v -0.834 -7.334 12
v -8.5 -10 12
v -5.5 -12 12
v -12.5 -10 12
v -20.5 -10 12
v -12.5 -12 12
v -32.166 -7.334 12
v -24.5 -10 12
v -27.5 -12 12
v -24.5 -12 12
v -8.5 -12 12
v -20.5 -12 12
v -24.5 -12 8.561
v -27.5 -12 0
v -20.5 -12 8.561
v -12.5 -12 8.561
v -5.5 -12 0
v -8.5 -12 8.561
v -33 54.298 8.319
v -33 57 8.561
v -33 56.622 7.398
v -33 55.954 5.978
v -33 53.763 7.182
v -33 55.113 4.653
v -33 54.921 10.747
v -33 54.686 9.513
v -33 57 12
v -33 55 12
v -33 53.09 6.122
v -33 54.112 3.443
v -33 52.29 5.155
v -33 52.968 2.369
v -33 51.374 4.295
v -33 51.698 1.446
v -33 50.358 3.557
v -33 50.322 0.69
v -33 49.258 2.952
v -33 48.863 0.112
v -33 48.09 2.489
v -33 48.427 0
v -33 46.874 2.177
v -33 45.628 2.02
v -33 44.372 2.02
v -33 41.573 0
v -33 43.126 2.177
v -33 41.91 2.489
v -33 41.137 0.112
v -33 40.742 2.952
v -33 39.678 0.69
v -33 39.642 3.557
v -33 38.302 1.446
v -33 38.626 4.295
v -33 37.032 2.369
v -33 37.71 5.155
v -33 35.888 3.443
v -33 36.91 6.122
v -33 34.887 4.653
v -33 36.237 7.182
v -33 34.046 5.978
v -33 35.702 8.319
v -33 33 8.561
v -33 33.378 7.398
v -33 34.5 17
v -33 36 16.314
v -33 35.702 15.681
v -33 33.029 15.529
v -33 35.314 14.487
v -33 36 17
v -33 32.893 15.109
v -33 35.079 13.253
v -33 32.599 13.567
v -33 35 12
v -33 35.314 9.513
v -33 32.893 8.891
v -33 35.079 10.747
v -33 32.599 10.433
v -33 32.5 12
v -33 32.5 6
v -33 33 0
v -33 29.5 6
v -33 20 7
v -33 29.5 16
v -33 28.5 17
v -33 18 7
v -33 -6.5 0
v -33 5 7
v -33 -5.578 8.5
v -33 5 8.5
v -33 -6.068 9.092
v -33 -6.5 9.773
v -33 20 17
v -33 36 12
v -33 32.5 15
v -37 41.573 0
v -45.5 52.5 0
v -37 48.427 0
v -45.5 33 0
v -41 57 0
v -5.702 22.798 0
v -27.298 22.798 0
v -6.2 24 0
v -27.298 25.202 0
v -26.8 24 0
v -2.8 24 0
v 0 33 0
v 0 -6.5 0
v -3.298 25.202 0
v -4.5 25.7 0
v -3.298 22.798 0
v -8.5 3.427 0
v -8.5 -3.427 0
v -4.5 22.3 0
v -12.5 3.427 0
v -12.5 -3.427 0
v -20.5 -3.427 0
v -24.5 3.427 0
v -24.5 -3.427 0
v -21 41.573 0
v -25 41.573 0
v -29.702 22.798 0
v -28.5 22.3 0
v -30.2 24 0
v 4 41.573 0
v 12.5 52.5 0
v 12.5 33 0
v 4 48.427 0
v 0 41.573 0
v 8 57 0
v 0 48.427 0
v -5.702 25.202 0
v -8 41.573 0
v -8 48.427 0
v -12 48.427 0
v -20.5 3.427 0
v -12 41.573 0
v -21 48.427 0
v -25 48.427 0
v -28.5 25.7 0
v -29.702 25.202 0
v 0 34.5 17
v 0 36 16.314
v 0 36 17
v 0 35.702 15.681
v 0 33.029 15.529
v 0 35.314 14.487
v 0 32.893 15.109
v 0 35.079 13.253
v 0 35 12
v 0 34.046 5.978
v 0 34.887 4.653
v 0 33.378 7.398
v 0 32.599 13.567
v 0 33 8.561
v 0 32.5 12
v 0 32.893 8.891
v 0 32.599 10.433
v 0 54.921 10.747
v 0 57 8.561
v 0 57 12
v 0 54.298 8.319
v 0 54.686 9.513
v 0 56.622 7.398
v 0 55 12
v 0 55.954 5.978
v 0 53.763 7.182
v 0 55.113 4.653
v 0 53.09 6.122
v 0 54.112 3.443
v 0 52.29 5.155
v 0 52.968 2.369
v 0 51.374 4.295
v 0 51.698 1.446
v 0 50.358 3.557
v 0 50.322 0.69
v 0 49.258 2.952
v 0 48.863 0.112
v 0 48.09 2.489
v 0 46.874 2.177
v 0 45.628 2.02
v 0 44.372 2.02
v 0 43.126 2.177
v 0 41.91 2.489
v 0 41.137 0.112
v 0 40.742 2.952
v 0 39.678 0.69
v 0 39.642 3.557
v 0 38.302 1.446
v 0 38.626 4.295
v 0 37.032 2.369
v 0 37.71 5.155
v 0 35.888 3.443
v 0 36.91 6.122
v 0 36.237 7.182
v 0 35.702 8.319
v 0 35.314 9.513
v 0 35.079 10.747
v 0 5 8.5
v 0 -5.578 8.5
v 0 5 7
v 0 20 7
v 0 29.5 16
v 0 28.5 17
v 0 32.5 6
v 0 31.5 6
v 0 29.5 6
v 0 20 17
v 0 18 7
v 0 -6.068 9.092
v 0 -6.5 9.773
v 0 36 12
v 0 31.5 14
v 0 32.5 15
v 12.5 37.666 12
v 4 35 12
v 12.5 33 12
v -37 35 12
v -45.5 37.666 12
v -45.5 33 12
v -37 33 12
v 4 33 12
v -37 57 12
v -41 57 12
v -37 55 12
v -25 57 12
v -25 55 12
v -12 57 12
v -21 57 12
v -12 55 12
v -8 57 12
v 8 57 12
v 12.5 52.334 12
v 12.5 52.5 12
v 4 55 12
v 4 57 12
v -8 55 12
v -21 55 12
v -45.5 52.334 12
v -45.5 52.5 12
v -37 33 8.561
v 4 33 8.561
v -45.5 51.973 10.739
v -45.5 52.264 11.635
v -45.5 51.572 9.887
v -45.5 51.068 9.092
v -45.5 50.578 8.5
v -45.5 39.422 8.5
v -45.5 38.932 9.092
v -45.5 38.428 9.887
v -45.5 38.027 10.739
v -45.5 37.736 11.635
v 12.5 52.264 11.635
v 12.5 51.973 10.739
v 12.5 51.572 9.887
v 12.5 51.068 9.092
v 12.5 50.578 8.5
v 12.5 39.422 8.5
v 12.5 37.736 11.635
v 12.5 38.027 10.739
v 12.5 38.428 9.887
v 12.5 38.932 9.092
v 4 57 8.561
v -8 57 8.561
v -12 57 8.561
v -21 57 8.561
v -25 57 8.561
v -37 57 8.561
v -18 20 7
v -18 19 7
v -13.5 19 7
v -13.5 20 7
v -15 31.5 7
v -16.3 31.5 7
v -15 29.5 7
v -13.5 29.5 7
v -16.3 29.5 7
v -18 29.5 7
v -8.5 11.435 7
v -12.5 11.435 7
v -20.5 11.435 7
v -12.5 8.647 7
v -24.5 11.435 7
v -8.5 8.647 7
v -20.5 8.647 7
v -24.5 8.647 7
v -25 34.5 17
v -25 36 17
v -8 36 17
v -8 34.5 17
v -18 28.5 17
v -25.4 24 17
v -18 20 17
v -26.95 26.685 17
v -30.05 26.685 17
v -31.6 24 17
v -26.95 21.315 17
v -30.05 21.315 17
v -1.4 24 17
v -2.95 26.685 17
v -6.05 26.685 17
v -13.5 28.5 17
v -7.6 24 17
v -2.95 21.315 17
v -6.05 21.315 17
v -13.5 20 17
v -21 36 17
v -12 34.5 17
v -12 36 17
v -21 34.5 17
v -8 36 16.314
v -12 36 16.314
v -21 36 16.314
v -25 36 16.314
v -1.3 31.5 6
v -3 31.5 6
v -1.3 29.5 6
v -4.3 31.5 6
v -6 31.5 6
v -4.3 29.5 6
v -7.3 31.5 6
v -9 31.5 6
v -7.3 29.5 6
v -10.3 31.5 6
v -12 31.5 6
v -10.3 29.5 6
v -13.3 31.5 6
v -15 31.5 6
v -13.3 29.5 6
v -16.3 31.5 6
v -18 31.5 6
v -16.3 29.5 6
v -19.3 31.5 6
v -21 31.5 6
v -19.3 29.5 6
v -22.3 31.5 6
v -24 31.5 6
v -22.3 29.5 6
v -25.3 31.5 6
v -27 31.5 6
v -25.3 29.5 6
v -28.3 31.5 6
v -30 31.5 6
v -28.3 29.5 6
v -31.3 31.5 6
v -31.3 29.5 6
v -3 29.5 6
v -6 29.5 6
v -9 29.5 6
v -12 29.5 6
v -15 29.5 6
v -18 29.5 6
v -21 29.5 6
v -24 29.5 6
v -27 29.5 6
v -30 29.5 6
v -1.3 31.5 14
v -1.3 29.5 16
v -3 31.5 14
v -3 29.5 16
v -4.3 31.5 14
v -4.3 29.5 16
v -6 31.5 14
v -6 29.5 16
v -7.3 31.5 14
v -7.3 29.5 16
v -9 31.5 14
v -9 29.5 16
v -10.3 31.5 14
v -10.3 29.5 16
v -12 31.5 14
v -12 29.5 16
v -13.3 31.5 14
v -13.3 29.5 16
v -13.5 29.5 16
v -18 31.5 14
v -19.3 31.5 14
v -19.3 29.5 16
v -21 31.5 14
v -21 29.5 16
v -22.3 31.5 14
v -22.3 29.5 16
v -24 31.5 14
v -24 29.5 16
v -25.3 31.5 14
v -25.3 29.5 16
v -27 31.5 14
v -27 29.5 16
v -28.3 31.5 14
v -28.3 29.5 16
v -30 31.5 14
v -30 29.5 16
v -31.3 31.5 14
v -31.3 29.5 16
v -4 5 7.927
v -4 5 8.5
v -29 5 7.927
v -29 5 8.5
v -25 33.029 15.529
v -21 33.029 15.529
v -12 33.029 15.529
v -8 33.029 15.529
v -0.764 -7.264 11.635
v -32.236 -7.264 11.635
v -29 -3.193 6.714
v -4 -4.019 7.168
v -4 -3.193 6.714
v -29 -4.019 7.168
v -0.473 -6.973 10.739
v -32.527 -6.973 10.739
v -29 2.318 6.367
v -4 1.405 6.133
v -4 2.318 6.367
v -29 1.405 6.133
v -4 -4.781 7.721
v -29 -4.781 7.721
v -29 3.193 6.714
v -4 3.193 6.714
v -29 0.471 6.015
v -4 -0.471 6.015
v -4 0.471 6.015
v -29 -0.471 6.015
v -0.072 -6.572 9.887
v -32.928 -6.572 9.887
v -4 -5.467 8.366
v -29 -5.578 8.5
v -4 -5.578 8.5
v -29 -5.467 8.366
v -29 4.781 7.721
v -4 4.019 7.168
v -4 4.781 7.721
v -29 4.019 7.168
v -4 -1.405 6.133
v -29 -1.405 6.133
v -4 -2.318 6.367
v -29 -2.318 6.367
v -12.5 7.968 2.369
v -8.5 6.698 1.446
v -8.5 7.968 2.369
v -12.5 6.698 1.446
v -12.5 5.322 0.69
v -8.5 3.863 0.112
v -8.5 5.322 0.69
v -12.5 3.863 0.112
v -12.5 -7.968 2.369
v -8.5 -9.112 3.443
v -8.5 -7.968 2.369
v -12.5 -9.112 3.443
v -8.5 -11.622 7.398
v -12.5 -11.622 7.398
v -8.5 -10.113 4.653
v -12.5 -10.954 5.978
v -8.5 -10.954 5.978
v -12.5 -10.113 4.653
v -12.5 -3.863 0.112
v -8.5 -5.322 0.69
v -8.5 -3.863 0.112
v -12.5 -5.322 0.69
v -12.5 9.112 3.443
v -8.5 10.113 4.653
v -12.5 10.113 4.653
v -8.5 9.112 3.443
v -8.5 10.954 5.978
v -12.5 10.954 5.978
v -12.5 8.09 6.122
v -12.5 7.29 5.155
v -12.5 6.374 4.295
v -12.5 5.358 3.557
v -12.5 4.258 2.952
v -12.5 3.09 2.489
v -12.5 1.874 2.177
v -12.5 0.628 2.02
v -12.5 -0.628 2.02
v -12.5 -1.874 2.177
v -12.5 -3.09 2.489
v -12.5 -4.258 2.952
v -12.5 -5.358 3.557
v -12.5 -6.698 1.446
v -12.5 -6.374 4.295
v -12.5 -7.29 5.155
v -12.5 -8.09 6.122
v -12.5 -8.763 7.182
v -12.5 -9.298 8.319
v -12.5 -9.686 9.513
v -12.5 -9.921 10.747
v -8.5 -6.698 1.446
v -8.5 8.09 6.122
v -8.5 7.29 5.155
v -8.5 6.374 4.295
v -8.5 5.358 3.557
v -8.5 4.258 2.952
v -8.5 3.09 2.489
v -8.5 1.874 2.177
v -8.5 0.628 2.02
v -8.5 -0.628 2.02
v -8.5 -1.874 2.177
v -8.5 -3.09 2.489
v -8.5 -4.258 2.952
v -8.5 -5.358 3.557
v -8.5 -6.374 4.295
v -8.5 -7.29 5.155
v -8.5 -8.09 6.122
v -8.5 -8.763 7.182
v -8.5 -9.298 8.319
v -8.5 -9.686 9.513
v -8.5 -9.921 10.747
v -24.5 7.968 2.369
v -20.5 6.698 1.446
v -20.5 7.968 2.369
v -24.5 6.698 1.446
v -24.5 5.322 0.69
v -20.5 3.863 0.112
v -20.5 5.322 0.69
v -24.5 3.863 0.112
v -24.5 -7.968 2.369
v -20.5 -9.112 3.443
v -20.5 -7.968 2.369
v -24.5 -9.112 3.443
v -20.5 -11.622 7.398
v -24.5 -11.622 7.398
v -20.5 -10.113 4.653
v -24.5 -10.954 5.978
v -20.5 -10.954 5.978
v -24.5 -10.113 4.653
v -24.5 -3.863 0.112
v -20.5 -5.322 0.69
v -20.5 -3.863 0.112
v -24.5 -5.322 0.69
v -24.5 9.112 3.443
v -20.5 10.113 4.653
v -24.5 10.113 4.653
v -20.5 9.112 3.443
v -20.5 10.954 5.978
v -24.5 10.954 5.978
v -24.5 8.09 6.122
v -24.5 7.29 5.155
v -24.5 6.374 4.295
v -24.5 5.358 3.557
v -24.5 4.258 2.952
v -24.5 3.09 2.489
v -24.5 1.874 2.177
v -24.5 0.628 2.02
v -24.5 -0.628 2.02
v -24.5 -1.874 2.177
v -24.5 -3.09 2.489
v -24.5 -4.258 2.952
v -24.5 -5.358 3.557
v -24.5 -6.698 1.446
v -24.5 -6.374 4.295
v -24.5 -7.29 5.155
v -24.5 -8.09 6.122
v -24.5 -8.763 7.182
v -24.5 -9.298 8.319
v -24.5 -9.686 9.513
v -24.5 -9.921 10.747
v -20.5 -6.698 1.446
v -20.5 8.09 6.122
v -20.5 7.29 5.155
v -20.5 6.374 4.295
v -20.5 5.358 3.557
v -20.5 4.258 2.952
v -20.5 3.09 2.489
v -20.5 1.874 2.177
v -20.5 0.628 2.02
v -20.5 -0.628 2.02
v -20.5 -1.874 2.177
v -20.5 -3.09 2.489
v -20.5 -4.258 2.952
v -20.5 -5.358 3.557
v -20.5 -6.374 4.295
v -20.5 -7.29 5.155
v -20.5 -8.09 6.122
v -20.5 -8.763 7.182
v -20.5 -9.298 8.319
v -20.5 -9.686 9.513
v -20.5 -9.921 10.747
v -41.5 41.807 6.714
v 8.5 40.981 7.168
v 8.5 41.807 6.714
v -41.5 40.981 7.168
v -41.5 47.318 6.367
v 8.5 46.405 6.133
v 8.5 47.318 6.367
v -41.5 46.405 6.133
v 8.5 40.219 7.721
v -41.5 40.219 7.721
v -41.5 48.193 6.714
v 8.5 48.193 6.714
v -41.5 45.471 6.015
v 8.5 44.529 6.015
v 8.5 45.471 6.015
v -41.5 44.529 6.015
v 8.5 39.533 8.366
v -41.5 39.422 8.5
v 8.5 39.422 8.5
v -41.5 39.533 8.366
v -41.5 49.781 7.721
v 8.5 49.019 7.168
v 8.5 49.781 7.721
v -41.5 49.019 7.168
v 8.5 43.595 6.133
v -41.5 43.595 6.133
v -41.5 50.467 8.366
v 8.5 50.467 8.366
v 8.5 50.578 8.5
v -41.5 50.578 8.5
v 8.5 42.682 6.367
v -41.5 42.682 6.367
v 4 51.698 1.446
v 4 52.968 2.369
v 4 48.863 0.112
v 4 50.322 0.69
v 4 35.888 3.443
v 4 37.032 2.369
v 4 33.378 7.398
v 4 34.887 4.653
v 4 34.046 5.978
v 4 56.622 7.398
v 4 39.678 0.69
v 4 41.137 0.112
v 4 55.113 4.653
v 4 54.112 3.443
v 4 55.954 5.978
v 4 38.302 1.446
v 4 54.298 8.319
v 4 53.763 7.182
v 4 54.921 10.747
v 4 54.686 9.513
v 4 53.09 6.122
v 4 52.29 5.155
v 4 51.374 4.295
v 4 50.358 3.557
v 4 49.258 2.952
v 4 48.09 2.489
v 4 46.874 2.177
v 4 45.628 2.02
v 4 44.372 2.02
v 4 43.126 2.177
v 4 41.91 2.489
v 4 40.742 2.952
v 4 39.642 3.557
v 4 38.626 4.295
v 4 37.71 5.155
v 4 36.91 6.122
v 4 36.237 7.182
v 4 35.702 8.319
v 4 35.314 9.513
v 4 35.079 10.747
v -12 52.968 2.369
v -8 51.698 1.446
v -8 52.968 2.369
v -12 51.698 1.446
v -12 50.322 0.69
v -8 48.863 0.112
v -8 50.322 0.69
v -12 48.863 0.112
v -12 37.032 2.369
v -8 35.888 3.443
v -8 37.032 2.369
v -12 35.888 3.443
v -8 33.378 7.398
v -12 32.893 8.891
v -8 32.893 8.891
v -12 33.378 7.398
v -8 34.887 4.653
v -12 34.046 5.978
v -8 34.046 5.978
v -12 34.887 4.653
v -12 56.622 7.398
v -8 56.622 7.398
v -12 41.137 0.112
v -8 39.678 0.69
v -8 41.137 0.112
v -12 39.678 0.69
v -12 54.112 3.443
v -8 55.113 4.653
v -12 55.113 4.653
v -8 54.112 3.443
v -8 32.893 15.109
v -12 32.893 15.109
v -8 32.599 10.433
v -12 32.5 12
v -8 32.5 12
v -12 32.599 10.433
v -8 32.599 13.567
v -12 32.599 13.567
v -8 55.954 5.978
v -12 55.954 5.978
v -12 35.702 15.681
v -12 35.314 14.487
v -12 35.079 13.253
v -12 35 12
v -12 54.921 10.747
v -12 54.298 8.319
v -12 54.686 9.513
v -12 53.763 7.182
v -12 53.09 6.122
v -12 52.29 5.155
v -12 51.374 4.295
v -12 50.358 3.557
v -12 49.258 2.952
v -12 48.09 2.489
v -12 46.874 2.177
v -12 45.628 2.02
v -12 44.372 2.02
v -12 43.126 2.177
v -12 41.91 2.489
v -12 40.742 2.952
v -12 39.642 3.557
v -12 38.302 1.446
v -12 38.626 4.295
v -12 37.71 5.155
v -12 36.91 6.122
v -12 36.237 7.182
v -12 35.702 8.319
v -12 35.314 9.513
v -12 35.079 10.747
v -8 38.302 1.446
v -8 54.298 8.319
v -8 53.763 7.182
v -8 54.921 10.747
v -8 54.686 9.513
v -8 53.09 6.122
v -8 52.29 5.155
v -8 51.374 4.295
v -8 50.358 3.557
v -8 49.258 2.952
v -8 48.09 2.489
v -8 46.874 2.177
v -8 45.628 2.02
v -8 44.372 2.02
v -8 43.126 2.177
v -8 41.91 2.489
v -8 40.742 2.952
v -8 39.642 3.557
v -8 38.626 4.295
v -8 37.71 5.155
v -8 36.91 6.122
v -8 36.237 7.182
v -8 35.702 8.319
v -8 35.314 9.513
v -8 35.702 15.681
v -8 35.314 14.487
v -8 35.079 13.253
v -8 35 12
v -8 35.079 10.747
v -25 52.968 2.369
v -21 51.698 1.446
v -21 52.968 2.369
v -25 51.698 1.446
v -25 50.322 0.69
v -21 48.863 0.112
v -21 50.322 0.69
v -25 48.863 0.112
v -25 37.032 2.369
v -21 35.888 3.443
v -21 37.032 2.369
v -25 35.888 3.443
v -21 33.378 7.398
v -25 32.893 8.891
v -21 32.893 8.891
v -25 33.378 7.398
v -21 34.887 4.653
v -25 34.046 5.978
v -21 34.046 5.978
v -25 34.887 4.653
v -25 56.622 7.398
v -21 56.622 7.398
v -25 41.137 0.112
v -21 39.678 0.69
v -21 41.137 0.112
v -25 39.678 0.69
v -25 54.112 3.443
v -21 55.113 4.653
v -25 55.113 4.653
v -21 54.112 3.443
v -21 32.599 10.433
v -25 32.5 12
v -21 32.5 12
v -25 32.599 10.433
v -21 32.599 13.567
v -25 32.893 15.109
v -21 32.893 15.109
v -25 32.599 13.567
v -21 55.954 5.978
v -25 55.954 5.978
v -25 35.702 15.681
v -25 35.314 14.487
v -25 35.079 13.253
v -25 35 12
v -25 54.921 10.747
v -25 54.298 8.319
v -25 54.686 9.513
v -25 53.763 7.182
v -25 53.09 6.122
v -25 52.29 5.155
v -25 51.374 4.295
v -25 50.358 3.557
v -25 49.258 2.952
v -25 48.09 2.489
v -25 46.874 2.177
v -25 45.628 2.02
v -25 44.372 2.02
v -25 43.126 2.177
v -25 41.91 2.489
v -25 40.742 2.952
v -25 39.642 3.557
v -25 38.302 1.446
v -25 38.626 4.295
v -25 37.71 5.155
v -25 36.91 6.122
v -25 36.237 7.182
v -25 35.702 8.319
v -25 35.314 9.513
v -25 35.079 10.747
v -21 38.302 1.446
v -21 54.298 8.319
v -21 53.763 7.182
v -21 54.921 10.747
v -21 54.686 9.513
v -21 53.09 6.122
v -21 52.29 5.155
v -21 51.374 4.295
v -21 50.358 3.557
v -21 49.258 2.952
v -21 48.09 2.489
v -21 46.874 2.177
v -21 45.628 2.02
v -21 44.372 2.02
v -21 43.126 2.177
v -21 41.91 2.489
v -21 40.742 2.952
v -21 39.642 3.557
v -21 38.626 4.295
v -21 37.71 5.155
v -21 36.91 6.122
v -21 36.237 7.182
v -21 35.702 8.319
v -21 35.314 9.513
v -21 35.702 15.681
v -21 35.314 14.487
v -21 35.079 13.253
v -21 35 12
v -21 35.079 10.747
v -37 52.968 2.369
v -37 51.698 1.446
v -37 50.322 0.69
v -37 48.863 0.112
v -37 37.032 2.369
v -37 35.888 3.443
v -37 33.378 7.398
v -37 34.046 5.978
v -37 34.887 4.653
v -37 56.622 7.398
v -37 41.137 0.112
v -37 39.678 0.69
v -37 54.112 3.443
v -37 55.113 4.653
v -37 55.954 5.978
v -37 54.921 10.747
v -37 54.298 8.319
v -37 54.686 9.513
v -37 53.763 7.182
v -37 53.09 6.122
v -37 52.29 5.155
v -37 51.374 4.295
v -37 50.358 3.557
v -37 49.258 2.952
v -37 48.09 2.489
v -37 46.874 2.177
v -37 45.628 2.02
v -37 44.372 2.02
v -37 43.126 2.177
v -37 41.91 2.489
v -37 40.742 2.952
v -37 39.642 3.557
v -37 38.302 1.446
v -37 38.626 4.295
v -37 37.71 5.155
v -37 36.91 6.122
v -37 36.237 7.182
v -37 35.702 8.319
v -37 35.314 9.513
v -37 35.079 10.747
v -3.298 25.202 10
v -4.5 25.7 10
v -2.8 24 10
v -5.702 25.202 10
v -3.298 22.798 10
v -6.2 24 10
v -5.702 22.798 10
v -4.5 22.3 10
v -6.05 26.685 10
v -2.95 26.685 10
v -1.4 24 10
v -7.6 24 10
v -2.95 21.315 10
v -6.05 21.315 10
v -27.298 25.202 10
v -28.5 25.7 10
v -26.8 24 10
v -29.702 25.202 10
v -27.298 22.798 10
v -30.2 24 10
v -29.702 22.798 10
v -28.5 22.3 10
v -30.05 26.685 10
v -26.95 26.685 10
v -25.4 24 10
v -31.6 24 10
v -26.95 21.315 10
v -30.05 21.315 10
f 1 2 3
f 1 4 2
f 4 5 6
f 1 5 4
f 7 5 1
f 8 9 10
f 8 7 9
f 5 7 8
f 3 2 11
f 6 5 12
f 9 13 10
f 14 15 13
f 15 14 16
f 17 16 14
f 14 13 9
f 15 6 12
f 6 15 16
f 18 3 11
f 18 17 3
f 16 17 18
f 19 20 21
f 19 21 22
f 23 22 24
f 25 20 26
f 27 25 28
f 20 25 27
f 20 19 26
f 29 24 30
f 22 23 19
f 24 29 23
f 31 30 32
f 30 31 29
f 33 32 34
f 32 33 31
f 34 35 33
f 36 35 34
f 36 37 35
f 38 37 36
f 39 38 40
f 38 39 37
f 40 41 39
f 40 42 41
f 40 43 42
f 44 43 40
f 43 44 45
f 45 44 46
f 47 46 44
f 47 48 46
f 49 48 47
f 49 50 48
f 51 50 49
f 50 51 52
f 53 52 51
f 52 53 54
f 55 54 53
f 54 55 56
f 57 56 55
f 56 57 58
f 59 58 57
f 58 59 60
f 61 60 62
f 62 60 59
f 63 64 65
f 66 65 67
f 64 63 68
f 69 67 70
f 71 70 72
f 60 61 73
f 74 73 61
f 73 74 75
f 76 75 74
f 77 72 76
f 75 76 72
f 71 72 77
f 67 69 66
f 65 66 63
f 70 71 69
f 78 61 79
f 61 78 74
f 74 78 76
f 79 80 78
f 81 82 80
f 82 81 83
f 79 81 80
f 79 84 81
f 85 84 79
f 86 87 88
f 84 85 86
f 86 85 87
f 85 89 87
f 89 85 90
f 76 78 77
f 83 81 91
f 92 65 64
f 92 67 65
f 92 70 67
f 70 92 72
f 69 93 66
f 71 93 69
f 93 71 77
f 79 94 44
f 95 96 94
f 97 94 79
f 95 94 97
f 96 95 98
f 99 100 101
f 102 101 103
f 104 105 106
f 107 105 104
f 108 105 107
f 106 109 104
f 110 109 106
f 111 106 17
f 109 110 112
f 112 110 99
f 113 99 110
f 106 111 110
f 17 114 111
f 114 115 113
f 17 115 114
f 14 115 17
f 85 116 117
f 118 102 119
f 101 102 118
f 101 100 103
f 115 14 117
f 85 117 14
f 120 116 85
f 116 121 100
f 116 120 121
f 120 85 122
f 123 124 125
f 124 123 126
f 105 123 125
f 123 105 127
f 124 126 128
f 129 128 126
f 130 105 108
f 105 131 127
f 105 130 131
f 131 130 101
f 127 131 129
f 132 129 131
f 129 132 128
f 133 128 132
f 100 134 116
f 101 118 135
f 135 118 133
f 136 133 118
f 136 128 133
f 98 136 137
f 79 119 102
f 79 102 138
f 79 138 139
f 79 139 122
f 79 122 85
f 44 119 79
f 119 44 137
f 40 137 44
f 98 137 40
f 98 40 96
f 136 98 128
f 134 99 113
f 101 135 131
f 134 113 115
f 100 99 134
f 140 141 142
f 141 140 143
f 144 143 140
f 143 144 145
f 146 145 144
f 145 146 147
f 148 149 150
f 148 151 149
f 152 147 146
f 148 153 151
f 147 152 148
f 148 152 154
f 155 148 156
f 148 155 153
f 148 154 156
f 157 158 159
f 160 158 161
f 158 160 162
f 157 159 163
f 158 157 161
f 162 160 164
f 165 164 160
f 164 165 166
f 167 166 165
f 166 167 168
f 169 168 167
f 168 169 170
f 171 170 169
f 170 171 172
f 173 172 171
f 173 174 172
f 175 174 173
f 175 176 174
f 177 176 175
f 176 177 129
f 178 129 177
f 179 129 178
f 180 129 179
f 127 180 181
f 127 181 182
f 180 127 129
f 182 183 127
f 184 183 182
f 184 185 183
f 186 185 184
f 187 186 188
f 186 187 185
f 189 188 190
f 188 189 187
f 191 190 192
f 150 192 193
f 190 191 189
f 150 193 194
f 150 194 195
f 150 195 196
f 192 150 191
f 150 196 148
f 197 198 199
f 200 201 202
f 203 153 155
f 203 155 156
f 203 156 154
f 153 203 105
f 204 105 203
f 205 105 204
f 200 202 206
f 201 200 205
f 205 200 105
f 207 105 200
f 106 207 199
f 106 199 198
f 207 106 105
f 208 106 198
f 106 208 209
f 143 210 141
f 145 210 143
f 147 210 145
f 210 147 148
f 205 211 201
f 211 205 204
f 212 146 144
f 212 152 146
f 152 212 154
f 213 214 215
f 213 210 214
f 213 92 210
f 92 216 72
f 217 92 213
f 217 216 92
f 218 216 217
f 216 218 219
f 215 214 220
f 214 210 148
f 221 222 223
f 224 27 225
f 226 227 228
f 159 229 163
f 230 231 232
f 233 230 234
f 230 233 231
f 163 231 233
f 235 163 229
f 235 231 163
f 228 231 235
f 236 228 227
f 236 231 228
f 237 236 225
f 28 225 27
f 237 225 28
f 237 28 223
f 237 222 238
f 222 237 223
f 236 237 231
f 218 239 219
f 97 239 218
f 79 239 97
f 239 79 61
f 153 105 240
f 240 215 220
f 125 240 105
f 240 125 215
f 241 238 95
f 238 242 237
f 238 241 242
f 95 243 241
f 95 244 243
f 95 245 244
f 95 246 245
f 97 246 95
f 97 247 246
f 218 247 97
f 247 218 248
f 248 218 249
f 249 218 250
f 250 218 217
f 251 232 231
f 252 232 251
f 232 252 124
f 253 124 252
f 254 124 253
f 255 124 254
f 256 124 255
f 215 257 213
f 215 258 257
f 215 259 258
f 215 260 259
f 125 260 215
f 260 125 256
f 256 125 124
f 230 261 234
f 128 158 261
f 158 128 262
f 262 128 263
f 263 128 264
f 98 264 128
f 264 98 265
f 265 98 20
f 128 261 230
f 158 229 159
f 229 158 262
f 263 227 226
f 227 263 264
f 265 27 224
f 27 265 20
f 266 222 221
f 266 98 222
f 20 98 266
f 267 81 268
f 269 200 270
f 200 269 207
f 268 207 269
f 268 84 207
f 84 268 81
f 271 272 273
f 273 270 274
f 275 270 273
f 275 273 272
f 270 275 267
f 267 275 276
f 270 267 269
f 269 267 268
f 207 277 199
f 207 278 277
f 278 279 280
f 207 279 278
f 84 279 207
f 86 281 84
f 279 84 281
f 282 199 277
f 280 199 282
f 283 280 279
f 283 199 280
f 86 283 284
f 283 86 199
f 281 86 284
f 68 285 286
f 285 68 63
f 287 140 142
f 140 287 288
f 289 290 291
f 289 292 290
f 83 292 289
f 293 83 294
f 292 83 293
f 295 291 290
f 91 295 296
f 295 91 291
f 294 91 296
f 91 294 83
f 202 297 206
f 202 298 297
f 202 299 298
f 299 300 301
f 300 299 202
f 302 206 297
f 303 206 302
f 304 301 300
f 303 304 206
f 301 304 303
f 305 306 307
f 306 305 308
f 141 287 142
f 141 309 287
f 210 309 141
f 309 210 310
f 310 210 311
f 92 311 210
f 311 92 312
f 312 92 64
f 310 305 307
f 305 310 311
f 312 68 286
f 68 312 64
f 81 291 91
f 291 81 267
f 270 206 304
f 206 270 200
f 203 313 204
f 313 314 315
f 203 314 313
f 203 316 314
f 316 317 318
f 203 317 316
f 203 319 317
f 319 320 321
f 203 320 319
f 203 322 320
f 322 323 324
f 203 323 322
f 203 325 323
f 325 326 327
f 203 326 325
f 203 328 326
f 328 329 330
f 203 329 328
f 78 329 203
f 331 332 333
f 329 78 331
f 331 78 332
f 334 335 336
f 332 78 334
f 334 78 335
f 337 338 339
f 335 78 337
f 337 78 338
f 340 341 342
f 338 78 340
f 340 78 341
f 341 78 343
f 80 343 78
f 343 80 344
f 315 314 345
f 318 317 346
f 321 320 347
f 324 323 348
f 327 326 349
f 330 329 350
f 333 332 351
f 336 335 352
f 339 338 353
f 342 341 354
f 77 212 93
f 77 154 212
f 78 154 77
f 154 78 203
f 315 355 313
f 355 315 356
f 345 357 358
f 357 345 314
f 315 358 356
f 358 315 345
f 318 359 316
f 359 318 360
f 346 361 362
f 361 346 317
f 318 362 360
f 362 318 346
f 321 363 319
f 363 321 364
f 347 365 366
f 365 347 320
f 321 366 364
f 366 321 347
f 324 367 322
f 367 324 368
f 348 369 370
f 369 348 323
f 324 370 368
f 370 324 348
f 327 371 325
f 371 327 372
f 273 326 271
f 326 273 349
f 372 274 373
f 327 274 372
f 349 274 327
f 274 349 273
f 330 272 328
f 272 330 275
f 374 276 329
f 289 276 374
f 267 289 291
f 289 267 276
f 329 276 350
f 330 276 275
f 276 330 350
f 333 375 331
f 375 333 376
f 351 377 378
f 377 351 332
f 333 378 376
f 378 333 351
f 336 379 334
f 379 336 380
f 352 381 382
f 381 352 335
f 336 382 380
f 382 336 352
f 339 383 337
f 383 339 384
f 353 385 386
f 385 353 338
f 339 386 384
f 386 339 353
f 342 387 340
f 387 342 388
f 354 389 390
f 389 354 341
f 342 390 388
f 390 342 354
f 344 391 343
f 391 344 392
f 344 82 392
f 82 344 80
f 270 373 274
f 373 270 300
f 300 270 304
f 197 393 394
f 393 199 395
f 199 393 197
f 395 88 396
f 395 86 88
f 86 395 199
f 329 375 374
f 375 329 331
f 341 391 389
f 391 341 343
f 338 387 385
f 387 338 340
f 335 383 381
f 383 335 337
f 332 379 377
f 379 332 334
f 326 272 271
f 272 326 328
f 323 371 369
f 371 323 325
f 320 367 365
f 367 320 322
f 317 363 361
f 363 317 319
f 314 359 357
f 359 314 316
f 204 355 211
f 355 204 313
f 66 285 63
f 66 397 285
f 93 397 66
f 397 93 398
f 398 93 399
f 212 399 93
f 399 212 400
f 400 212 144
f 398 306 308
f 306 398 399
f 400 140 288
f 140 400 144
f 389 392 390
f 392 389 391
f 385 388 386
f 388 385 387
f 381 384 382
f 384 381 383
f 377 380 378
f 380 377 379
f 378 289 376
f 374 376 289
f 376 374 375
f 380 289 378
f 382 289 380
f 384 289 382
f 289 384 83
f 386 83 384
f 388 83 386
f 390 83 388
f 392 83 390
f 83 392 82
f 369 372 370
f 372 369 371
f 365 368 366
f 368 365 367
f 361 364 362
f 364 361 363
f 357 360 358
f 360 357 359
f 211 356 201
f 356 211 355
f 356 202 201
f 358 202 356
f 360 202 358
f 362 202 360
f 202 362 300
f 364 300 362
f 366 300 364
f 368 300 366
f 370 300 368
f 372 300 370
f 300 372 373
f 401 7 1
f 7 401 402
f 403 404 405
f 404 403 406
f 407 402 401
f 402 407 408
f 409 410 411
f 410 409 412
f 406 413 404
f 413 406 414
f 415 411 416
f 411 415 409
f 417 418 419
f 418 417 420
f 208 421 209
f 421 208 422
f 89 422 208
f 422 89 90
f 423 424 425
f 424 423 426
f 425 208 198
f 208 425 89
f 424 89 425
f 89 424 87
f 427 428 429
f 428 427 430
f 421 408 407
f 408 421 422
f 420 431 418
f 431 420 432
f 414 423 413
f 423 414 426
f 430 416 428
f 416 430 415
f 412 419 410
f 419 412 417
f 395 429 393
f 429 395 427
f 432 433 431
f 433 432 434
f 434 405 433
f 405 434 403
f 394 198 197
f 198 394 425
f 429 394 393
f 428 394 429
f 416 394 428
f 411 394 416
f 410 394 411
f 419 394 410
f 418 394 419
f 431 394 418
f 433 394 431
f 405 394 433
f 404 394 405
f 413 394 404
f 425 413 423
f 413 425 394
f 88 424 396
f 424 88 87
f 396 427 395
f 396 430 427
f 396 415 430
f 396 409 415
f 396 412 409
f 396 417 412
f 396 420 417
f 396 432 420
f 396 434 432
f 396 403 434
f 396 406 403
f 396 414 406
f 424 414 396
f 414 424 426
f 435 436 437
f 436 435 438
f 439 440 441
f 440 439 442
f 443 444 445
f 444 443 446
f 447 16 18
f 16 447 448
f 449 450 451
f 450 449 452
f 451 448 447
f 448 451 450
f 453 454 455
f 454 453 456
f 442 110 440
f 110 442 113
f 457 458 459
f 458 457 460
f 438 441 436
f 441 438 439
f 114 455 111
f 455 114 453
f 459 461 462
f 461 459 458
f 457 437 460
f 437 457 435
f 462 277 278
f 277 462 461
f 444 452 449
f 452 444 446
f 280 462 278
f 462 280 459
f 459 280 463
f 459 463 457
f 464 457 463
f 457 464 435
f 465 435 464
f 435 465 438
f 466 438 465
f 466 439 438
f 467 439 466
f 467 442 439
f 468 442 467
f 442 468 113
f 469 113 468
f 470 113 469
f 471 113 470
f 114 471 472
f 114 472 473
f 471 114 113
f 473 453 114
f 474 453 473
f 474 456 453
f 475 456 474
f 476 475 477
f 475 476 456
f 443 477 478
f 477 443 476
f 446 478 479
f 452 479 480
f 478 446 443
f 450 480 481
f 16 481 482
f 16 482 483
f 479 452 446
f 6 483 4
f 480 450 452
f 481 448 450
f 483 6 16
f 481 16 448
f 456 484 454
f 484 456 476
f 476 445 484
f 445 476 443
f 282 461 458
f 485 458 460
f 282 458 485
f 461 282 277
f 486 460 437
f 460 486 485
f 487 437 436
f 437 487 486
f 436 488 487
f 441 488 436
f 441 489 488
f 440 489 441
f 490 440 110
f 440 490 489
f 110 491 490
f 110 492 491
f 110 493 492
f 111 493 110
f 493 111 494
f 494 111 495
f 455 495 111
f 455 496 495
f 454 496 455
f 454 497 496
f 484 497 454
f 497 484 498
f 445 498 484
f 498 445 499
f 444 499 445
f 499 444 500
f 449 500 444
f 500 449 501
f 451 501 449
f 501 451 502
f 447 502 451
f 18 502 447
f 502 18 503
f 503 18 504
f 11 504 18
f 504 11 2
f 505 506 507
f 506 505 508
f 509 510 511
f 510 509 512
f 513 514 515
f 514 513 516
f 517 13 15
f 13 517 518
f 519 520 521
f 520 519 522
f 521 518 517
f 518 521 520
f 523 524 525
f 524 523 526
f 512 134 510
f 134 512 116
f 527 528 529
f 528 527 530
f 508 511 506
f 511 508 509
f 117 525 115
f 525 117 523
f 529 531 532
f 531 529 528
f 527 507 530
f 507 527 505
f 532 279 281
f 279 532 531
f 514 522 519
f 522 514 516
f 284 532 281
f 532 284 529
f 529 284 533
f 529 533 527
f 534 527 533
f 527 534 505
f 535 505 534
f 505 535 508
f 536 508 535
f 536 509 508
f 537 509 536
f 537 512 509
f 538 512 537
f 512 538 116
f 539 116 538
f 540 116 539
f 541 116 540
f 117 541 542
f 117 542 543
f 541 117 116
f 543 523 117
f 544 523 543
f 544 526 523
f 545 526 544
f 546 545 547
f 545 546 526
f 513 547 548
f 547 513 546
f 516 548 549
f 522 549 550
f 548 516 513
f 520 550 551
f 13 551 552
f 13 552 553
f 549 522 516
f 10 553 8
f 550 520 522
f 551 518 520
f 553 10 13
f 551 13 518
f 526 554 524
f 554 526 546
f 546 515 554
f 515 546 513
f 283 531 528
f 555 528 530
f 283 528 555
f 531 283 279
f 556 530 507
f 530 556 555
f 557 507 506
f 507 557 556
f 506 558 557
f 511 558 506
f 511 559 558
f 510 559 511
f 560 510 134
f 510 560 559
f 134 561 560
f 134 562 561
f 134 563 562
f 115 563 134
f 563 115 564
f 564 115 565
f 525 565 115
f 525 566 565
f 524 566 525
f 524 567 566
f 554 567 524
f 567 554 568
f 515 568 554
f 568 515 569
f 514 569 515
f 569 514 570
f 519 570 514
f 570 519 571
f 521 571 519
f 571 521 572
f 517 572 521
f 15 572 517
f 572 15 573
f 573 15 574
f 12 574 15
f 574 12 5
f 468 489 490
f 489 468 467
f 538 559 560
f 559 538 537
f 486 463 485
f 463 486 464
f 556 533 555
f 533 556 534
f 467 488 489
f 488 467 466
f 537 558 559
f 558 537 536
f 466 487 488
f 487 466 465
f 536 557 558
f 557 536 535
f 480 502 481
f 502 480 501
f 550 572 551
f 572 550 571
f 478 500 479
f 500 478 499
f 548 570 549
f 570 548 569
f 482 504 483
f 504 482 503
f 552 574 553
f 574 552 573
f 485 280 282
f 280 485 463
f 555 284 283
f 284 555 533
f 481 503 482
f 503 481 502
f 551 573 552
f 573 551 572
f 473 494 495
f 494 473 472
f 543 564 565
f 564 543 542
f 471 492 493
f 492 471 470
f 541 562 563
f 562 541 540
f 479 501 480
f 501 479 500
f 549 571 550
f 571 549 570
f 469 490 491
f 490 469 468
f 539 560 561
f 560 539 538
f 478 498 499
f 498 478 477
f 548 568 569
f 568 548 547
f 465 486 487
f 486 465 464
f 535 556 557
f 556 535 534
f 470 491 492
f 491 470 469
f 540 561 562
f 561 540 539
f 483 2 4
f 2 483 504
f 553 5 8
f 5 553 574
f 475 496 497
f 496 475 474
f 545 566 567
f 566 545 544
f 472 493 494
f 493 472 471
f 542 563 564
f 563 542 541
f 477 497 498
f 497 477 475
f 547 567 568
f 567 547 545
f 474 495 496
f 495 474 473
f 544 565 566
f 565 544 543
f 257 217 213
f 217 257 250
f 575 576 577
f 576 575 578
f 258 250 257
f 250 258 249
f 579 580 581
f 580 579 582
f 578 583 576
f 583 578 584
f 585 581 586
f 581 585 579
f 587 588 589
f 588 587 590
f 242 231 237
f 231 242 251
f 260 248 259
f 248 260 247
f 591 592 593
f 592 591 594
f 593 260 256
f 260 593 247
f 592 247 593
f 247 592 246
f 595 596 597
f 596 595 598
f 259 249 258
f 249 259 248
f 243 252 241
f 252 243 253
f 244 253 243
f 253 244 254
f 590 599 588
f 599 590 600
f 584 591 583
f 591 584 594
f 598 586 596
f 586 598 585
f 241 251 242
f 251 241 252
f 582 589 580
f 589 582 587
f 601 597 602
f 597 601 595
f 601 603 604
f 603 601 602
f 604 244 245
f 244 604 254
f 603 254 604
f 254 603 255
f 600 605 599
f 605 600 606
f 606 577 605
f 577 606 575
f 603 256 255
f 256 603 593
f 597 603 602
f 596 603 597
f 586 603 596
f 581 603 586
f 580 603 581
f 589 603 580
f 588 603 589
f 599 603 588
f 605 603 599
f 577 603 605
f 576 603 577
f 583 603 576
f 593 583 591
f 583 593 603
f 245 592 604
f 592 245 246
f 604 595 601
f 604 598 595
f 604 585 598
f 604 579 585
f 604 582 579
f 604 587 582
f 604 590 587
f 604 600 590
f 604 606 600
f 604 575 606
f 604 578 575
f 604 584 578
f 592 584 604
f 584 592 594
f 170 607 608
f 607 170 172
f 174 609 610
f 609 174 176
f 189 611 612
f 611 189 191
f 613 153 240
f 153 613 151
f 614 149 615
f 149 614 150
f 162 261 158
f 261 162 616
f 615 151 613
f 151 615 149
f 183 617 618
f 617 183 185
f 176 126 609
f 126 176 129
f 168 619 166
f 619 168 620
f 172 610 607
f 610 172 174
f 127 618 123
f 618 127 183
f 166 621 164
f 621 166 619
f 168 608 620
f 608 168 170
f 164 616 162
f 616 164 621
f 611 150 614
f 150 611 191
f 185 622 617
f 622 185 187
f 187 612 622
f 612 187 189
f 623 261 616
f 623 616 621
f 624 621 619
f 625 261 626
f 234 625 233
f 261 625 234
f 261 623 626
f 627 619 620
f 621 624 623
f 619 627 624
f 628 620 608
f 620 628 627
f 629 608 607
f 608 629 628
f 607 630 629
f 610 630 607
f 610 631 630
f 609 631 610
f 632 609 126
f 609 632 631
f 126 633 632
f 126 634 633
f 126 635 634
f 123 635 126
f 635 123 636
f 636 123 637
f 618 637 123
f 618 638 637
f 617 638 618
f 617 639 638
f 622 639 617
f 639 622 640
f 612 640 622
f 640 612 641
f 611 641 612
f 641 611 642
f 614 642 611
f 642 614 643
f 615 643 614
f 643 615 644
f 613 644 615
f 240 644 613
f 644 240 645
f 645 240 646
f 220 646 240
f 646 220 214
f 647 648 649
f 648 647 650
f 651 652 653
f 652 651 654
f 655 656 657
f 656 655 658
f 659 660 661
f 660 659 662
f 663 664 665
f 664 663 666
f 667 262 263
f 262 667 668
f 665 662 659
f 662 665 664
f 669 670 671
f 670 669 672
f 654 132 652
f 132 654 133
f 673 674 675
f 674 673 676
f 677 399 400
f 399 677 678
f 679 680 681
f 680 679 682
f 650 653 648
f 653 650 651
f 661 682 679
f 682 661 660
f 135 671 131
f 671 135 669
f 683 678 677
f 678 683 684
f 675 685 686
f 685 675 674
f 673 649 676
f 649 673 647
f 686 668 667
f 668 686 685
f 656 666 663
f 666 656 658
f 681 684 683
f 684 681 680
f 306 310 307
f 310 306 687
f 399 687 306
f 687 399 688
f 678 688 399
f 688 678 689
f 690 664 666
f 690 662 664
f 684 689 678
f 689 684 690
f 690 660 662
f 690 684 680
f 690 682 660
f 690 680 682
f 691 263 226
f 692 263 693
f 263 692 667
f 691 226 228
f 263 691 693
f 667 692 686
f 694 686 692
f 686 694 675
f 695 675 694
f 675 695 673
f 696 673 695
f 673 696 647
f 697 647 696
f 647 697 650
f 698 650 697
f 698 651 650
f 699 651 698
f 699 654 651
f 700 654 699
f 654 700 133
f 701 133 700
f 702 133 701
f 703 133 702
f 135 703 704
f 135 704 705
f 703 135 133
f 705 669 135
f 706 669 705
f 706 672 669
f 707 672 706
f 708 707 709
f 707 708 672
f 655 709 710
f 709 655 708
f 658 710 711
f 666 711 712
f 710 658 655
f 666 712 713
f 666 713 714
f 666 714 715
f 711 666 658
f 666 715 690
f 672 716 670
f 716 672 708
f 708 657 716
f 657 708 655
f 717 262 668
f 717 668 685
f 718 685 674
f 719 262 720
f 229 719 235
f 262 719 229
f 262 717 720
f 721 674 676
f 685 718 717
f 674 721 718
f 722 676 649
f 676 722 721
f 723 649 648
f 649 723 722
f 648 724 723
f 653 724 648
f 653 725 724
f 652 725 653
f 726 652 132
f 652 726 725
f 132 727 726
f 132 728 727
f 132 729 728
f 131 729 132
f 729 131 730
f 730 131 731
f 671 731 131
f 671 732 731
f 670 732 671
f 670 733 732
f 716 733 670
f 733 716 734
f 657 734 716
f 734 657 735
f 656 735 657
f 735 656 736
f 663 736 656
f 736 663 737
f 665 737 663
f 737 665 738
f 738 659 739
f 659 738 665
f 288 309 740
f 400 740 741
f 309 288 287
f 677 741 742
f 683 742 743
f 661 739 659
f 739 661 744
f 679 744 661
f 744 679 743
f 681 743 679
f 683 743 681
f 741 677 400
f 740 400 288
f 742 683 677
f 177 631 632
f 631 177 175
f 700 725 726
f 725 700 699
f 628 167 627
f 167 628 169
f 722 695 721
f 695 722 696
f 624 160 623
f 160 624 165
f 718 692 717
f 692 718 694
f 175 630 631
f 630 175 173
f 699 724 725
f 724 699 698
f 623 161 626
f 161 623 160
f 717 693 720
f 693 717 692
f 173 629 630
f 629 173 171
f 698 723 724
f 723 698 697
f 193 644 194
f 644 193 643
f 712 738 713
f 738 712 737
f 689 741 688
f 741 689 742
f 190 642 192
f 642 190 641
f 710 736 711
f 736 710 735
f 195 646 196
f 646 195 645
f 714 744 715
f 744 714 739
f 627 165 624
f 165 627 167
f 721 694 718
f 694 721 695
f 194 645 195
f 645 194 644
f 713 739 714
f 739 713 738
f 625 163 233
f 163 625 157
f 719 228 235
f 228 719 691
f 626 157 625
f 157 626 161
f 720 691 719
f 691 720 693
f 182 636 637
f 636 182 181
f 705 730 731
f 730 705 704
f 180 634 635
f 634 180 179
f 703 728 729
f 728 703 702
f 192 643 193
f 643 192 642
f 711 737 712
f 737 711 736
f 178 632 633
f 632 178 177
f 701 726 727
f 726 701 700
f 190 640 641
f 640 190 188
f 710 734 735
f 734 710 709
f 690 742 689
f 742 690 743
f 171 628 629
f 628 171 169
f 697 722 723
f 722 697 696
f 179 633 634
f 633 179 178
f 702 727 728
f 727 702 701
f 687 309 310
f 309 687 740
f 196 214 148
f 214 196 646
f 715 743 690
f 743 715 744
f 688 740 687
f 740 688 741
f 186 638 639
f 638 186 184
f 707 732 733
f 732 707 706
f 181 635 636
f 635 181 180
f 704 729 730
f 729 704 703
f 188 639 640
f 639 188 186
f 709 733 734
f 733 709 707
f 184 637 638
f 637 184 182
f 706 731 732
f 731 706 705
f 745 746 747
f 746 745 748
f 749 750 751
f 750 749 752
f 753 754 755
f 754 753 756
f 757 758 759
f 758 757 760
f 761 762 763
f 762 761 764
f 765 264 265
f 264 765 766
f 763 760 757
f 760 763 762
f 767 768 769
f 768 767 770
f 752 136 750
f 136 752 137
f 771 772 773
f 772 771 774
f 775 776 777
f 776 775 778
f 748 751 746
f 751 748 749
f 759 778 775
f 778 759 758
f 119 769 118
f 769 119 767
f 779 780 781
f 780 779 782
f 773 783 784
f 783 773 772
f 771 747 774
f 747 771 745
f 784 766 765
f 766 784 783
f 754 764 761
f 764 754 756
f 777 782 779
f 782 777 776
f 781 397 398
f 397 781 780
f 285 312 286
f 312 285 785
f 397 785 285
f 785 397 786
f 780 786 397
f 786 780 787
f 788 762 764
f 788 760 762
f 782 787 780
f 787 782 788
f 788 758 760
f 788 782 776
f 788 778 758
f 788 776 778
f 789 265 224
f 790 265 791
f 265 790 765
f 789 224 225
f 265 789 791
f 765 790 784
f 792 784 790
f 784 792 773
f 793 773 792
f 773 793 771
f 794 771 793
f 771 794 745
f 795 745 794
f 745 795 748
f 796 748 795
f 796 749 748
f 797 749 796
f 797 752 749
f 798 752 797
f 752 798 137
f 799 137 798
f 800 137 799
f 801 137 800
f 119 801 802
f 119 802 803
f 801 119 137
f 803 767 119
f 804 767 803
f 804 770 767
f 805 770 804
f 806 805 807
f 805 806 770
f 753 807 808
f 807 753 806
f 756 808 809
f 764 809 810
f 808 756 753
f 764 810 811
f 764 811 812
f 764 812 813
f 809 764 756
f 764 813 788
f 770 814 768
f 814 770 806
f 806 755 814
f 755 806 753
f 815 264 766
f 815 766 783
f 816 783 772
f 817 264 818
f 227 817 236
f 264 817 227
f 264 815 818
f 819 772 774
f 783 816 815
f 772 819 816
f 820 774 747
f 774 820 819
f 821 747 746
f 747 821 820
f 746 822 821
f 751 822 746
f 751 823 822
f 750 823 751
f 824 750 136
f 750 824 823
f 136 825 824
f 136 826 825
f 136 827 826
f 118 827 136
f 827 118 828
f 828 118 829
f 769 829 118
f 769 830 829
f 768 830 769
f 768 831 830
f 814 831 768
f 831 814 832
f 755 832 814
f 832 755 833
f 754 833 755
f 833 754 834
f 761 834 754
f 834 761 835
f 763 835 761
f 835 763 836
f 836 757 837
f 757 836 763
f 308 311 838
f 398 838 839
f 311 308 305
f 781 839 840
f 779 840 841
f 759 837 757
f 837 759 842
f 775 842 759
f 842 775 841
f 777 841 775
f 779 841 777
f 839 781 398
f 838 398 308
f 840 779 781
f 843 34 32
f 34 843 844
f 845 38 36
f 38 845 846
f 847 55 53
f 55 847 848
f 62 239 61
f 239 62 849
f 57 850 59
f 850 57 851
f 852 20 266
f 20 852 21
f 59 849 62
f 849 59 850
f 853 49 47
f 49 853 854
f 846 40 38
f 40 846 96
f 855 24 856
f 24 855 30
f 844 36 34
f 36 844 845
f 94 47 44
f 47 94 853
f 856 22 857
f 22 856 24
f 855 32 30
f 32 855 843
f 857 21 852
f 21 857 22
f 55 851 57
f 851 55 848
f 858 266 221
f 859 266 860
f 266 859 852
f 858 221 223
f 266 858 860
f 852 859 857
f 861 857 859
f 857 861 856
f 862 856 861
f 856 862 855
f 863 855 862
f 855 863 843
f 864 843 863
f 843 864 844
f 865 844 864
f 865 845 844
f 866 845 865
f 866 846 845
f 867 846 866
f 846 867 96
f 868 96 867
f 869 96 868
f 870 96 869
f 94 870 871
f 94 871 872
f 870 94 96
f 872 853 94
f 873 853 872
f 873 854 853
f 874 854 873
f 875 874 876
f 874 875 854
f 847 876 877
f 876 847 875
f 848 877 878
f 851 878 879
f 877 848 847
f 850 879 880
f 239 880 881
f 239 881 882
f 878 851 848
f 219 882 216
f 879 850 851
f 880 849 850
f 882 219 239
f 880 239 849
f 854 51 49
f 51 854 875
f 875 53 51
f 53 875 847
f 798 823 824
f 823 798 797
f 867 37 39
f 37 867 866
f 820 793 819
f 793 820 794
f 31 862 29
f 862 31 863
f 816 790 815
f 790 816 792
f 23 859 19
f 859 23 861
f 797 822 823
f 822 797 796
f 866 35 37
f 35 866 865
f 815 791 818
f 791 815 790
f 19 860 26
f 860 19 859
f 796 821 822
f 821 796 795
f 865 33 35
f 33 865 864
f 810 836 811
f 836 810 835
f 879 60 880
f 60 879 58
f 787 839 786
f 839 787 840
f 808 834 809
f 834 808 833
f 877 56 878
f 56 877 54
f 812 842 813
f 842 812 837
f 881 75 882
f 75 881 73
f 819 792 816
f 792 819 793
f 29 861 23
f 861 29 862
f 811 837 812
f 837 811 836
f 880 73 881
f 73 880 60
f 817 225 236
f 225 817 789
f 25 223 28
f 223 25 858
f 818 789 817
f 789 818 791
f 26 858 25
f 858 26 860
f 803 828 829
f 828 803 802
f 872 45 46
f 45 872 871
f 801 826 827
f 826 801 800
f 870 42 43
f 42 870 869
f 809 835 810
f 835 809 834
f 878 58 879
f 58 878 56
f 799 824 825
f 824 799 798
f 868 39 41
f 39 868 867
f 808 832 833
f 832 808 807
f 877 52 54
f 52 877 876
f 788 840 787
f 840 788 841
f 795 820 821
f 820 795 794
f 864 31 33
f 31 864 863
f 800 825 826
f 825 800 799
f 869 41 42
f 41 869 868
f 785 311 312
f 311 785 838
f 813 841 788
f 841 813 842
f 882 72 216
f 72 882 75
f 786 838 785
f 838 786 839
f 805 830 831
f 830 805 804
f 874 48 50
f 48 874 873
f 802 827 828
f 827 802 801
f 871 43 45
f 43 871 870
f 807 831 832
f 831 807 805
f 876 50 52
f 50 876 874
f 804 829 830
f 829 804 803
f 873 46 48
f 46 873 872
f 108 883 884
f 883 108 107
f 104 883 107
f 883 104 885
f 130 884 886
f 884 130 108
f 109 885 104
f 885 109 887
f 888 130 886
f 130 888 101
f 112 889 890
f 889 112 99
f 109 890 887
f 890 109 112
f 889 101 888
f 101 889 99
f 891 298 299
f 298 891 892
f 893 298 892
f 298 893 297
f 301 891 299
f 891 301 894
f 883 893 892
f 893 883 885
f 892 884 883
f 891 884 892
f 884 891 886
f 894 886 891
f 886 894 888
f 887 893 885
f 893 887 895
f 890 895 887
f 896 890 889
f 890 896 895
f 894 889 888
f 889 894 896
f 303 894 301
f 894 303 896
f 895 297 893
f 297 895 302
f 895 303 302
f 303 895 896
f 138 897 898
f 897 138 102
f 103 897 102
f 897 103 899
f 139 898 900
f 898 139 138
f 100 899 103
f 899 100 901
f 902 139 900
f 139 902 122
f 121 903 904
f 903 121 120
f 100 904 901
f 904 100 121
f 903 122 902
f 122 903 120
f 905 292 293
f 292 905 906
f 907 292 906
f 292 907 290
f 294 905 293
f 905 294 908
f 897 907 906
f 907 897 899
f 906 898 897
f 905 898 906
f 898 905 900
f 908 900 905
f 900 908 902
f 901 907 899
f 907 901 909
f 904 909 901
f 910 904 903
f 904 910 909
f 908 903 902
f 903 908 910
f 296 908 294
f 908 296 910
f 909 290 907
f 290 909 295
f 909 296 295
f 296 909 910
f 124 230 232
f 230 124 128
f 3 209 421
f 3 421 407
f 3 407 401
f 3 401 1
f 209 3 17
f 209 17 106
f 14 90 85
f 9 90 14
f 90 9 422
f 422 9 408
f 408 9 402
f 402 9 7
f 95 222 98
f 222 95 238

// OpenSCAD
// file: inc/bearing.scad
// PRUSA iteration3
// Bearing holders
// GNU GPL v3
// Josef Průša <iam@josefprusa.cz> and contributors
// http://www.reprap.org/wiki/Prusa_Mendel
// http://prusamendel.org

bearing_diameter = 15;

module horizontal_bearing_base(bearings=1){
 translate(v=[0,0,6]) cube(size = [24,8+bearings*25,12], center = true);	
}
module horizontal_bearing_holes(bearings=1){
 cutter_lenght = 10+bearings*25;
 one_holder_lenght = 8+25;
 holder_lenght = 8+bearings*25;
 
 // Main bearing cut
 difference(){
  translate(v=[0,0,12+1.5]) rotate(a=[90,0,0]) translate(v=[0,0,-cutter_lenght/2]) cylinder(h = cutter_lenght, r=bearing_diameter/2, $fn=50);
  // Bearing retainers
  translate(v=[0,1-holder_lenght/2,3+1.5]) cube(size = [24,6,8], center = true);
  translate(v=[0,-1+holder_lenght/2,3+1.5]) cube(size = [24,6,8], center = true);
 }
 
 // Ziptie cutouts
 ziptie_cut_ofset = 0;
 for ( i = [0 : bearings-1] ){
  // For easier positioning I move them by half of one 
  // bearing holder then add each bearign lenght and then center again
  translate(v=[0,-holder_lenght/2,0]) translate(v=[0,one_holder_lenght/2+i*25,0]) difference(){
   union(){
    translate(v=[0,2-6,12]) rotate(a=[90,0,0]) translate(v=[0,0,0]) cylinder(h = 4, r=12.5, $fn=50);
    translate(v=[0,2+6,12]) rotate(a=[90,0,0]) translate(v=[0,0,0]) cylinder(h = 4, r=12.5, $fn=50);
   }
   translate(v=[0,10,12]) rotate(a=[90,0,0]) translate(v=[0,0,0]) cylinder(h = 24, r=10, $fn=50);
  }
 }
 
}

module horizontal_bearing_test(){
 difference(){
  horizontal_bearing_base(1);
  horizontal_bearing_holes(1);
 }
 translate(v=[30,0,0]) difference(){
  horizontal_bearing_base(2);
  horizontal_bearing_holes(2);
 }
 translate(v=[60,0,0]) difference(){
  horizontal_bearing_base(3);
  horizontal_bearing_holes(3);
 }
}



thinwall = 3;
bearing_size = bearing_diameter + 2 * thinwall;

module vertical_bearing_base(){
 translate(v=[-bearing_size/2,0,30]) cube(size = [bearing_size,bearing_size,60], center = true);
 cylinder(h = 60, r=bearing_size/2, $fn = 60);
}

module vertical_bearing_holes(){
  translate(v=[0,0,-1]) cylinder(h = 62, r=bearing_diameter/2, $fn = 60);
  rotate(a=[0,0,-60]) translate(v=[10,0,31]) cube(size = [10,1,62], center = true);
}

difference(){
vertical_bearing_base();
vertical_bearing_holes();
}
// main file
// PRUSA iteration3
// X carriage
// GNU GPL v3
// Josef Průša <iam@josefprusa.cz> and contributors
// http://www.reprap.org/wiki/Prusa_Mendel
// http://prusamendel.org

use <inc/bearing.scad>

module x_carriage_base(){
 // Small bearing holder
 translate([-33/2,0,0]) rotate([0,0,90]) horizontal_bearing_base(1);
 // Long bearing holder
 translate([-33/2,45,0]) rotate([0,0,90]) horizontal_bearing_base(2);
 // Base plate
 translate([-33,-11.5,0]) cube([33,68,7]);
 // Belt holder base
 translate([-33,20,0]) cube([33,16,17]);
}

module x_carriage_beltcut(){
 // Cut in the middle for belt
 translate([-2.5-16.5+1,19,7]) cube([4.5,13,15]);
 // Cut clearing space for the belt
 translate([-38,5,7]) cube([40,13,15]);
 // Belt slit
 translate([-66,21.5+10,6]) cube([67,1,15]);
 // Smooth entrance
 translate([-66,21.5+10,14]) rotate([45,0,0]) cube([67,15,15]);
 // Teeth cuts
 for ( i = [0 : 23] ){
  translate([0-i*3,21.5+8,6]) cube([1.7,3,15]);
 }
}

module x_carriage_holes(){
 // Small bearing holder holes cutter
 translate([-33/2,0,0]) rotate([0,0,90]) horizontal_bearing_holes(1);
 // Long bearing holder holes cutter
 translate([-33/2,45,0]) rotate([0,0,90]) horizontal_bearing_holes(2);
  // Extruder mounting holes
  translate([-16.5+12,24,-1])cylinder(r=1.7, h=20, $fn=8);
  translate([-16.5+12,24,10])cylinder(r=3.1, h=20, $fn=6); 
  translate([-16.5-12,24,-1])cylinder(r=1.7, h=20, $fn=8);
  translate([-16.5-12,24,10])cylinder(r=3.1, h=20, $fn=6); 	
}

module x_carriage_fancy(){
 // Top right corner
 translate([13.5,-5,0]) translate([0,45+11.5,-1]) rotate([0,0,45]) translate([0,-15,0]) cube([30,30,20]);
 // Bottom right corner
 translate([0,5,0]) translate([0,-11.5,-1]) rotate([0,0,-45]) translate([0,-15,0]) cube([30,30,20]);
 // Bottom ĺeft corner
 translate([-33,5,0]) translate([0,-11.5,-1]) rotate([0,0,-135]) translate([0,-15,0]) cube([30,30,20]);
 // Top left corner
 translate([-33-13.5,-5,0]) translate([0,45+11.5,-1]) rotate([0,0,135]) translate([0,-15,0]) cube([30,30,20]);	
}

// Final part
module x_carriage(){
 difference(){
  x_carriage_base();
  x_carriage_beltcut();
  x_carriage_holes();
  x_carriage_fancy();
 }
}

x_carriage();
